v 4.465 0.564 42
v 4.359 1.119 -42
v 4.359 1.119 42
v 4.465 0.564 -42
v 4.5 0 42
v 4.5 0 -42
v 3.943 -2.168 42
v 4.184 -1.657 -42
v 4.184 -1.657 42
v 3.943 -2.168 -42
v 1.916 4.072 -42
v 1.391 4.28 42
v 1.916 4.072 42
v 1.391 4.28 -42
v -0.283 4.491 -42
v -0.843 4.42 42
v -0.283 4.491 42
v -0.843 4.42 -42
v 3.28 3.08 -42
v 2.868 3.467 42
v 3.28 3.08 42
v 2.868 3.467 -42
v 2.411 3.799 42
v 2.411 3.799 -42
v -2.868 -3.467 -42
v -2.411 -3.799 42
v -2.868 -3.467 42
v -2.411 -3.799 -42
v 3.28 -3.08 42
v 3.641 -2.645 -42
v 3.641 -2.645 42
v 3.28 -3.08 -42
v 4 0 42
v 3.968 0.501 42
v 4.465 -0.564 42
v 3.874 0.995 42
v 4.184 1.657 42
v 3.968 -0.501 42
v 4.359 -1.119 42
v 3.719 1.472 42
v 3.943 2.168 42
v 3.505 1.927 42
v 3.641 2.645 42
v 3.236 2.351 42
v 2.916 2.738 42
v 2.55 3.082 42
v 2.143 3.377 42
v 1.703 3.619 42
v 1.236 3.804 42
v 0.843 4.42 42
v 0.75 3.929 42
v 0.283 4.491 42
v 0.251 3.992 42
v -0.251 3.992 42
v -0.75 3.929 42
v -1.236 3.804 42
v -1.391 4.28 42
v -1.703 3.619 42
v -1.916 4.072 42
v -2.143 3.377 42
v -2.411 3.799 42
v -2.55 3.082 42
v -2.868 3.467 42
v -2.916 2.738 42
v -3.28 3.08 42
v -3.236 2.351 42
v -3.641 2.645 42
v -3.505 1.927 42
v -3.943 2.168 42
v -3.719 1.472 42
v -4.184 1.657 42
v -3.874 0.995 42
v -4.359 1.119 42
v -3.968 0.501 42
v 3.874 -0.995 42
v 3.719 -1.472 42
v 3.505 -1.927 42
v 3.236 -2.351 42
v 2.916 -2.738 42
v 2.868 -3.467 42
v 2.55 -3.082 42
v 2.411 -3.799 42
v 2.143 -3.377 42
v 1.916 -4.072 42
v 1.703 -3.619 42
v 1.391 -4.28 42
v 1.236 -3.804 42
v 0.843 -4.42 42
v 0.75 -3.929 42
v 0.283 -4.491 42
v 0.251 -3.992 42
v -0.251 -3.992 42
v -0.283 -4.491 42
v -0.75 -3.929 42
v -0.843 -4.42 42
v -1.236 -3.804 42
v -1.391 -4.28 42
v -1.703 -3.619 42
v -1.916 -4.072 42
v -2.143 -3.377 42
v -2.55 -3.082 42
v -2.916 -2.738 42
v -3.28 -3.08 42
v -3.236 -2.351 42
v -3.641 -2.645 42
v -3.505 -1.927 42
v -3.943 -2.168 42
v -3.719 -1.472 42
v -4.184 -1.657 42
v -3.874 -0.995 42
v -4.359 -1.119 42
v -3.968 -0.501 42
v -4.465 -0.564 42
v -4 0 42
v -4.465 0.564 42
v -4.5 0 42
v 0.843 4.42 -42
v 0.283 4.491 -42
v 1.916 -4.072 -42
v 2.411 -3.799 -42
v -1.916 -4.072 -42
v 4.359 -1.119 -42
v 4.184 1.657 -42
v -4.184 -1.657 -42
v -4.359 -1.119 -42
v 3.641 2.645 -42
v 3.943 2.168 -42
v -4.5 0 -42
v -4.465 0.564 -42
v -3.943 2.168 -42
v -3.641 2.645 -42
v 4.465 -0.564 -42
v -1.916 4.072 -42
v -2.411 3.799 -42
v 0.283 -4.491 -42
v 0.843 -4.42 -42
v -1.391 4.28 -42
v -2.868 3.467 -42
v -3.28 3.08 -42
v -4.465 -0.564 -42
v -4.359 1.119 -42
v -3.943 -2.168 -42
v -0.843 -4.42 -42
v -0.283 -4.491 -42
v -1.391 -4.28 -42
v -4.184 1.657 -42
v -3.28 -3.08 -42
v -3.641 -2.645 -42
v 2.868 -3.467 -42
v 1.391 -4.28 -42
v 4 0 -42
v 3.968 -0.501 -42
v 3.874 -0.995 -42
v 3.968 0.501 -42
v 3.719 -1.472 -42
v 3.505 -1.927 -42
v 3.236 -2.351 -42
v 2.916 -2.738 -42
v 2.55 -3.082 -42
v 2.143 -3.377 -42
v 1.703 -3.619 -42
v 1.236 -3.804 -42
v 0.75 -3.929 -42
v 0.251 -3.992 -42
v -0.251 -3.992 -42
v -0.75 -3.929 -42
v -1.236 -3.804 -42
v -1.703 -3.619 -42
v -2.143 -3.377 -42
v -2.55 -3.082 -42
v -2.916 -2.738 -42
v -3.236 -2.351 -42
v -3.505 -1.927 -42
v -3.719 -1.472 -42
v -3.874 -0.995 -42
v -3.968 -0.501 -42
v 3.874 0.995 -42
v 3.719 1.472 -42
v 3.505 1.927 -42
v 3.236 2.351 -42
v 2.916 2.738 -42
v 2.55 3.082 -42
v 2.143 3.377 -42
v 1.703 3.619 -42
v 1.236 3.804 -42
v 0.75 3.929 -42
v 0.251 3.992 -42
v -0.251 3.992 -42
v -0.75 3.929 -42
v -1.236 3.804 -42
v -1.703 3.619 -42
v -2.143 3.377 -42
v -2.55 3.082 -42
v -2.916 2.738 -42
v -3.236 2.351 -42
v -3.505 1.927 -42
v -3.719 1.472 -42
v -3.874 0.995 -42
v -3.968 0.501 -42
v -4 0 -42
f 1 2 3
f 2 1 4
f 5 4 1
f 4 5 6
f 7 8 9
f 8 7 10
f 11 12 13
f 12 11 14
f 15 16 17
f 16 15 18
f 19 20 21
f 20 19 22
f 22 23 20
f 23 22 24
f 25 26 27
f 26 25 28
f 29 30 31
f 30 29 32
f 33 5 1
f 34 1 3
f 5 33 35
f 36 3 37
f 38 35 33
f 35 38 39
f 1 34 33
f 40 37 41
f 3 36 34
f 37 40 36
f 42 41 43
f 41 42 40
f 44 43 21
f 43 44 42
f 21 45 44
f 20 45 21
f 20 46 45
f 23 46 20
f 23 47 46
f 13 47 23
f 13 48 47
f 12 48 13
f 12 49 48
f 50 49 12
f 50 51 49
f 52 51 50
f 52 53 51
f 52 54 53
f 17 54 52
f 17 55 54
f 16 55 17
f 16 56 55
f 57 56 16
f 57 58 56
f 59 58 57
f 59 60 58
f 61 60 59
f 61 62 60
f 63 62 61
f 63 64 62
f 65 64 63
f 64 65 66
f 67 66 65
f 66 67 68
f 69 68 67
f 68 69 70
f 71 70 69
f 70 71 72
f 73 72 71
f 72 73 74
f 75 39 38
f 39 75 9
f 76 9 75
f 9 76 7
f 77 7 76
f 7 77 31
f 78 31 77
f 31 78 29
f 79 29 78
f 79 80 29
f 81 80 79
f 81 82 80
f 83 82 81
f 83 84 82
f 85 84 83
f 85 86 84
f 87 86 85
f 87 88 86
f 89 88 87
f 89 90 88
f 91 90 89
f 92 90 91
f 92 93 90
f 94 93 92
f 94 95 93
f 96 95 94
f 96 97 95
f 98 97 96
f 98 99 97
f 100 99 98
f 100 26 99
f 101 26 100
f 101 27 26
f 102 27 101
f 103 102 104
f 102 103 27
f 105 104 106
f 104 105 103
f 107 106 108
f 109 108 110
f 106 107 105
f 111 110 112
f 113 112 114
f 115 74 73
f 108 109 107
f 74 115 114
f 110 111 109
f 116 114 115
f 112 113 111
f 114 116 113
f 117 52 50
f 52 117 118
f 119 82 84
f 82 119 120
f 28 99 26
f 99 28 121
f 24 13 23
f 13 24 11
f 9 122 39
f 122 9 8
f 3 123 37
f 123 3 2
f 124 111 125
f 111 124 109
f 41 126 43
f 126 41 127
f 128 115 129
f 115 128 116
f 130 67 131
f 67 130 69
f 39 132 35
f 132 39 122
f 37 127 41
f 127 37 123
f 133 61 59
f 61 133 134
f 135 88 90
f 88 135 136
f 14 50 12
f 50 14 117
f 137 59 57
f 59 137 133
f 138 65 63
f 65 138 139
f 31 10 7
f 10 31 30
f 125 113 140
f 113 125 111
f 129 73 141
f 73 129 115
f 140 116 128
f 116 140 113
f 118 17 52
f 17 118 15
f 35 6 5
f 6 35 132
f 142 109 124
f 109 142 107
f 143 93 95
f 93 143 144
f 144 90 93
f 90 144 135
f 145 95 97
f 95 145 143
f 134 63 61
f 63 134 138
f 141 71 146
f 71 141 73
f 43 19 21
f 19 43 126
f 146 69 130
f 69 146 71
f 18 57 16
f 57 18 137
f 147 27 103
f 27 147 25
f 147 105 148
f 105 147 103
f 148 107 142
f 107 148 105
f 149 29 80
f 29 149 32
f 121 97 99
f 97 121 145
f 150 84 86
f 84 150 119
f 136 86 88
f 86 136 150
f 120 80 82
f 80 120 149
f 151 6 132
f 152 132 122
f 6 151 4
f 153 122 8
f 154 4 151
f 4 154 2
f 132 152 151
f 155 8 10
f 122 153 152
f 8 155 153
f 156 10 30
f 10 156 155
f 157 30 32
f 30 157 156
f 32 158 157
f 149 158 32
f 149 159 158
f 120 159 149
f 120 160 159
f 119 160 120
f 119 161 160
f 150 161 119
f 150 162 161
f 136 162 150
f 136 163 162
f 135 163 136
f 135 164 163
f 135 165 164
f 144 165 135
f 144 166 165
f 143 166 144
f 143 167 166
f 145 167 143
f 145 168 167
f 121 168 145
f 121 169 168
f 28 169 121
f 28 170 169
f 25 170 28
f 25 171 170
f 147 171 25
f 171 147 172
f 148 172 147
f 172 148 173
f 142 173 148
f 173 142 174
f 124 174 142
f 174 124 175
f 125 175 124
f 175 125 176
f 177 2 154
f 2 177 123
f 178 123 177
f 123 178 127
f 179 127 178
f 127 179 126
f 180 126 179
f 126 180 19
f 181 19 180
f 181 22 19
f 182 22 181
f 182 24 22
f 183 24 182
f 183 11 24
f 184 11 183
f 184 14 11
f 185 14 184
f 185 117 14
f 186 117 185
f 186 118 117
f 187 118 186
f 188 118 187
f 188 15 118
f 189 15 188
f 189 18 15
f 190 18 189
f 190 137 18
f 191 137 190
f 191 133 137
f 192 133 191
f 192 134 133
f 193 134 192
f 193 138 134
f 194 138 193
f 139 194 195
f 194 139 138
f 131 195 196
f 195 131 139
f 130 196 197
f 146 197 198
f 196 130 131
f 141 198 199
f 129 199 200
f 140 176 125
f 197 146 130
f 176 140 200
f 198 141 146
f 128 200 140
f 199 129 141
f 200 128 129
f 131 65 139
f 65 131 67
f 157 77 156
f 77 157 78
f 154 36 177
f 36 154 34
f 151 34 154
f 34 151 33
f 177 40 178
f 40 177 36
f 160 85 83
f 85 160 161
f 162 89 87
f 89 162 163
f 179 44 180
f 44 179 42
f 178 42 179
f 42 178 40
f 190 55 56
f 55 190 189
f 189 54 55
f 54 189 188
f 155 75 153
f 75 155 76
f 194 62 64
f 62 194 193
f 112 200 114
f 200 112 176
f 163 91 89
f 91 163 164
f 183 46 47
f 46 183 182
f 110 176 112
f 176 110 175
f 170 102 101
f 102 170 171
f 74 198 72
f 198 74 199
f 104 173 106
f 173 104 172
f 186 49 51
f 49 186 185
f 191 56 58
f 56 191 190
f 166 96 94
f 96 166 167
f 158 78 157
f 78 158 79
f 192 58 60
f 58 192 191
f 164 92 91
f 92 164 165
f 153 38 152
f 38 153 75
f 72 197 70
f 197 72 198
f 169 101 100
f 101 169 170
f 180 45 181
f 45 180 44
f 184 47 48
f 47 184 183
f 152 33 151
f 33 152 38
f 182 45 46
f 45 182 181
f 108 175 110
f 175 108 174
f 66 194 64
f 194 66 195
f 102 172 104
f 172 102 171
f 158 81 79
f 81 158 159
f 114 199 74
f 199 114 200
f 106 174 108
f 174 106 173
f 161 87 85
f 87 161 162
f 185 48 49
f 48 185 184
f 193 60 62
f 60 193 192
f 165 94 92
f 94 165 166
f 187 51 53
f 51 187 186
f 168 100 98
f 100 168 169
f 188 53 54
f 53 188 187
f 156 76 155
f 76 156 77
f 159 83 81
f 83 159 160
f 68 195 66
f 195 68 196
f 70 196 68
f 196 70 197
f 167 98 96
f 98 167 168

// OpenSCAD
$fn = 50;


difference() {
	union() {
		translate(v = [0, 0, -42.0000000000]) {
			cylinder(h = 84, r = 4.5000000000);
		}
	}
	union() {
		translate(v = [0, 0, -100.0000000000]) {
			cylinder(h = 200, r = 4.0000000000);
		}
	}
}
